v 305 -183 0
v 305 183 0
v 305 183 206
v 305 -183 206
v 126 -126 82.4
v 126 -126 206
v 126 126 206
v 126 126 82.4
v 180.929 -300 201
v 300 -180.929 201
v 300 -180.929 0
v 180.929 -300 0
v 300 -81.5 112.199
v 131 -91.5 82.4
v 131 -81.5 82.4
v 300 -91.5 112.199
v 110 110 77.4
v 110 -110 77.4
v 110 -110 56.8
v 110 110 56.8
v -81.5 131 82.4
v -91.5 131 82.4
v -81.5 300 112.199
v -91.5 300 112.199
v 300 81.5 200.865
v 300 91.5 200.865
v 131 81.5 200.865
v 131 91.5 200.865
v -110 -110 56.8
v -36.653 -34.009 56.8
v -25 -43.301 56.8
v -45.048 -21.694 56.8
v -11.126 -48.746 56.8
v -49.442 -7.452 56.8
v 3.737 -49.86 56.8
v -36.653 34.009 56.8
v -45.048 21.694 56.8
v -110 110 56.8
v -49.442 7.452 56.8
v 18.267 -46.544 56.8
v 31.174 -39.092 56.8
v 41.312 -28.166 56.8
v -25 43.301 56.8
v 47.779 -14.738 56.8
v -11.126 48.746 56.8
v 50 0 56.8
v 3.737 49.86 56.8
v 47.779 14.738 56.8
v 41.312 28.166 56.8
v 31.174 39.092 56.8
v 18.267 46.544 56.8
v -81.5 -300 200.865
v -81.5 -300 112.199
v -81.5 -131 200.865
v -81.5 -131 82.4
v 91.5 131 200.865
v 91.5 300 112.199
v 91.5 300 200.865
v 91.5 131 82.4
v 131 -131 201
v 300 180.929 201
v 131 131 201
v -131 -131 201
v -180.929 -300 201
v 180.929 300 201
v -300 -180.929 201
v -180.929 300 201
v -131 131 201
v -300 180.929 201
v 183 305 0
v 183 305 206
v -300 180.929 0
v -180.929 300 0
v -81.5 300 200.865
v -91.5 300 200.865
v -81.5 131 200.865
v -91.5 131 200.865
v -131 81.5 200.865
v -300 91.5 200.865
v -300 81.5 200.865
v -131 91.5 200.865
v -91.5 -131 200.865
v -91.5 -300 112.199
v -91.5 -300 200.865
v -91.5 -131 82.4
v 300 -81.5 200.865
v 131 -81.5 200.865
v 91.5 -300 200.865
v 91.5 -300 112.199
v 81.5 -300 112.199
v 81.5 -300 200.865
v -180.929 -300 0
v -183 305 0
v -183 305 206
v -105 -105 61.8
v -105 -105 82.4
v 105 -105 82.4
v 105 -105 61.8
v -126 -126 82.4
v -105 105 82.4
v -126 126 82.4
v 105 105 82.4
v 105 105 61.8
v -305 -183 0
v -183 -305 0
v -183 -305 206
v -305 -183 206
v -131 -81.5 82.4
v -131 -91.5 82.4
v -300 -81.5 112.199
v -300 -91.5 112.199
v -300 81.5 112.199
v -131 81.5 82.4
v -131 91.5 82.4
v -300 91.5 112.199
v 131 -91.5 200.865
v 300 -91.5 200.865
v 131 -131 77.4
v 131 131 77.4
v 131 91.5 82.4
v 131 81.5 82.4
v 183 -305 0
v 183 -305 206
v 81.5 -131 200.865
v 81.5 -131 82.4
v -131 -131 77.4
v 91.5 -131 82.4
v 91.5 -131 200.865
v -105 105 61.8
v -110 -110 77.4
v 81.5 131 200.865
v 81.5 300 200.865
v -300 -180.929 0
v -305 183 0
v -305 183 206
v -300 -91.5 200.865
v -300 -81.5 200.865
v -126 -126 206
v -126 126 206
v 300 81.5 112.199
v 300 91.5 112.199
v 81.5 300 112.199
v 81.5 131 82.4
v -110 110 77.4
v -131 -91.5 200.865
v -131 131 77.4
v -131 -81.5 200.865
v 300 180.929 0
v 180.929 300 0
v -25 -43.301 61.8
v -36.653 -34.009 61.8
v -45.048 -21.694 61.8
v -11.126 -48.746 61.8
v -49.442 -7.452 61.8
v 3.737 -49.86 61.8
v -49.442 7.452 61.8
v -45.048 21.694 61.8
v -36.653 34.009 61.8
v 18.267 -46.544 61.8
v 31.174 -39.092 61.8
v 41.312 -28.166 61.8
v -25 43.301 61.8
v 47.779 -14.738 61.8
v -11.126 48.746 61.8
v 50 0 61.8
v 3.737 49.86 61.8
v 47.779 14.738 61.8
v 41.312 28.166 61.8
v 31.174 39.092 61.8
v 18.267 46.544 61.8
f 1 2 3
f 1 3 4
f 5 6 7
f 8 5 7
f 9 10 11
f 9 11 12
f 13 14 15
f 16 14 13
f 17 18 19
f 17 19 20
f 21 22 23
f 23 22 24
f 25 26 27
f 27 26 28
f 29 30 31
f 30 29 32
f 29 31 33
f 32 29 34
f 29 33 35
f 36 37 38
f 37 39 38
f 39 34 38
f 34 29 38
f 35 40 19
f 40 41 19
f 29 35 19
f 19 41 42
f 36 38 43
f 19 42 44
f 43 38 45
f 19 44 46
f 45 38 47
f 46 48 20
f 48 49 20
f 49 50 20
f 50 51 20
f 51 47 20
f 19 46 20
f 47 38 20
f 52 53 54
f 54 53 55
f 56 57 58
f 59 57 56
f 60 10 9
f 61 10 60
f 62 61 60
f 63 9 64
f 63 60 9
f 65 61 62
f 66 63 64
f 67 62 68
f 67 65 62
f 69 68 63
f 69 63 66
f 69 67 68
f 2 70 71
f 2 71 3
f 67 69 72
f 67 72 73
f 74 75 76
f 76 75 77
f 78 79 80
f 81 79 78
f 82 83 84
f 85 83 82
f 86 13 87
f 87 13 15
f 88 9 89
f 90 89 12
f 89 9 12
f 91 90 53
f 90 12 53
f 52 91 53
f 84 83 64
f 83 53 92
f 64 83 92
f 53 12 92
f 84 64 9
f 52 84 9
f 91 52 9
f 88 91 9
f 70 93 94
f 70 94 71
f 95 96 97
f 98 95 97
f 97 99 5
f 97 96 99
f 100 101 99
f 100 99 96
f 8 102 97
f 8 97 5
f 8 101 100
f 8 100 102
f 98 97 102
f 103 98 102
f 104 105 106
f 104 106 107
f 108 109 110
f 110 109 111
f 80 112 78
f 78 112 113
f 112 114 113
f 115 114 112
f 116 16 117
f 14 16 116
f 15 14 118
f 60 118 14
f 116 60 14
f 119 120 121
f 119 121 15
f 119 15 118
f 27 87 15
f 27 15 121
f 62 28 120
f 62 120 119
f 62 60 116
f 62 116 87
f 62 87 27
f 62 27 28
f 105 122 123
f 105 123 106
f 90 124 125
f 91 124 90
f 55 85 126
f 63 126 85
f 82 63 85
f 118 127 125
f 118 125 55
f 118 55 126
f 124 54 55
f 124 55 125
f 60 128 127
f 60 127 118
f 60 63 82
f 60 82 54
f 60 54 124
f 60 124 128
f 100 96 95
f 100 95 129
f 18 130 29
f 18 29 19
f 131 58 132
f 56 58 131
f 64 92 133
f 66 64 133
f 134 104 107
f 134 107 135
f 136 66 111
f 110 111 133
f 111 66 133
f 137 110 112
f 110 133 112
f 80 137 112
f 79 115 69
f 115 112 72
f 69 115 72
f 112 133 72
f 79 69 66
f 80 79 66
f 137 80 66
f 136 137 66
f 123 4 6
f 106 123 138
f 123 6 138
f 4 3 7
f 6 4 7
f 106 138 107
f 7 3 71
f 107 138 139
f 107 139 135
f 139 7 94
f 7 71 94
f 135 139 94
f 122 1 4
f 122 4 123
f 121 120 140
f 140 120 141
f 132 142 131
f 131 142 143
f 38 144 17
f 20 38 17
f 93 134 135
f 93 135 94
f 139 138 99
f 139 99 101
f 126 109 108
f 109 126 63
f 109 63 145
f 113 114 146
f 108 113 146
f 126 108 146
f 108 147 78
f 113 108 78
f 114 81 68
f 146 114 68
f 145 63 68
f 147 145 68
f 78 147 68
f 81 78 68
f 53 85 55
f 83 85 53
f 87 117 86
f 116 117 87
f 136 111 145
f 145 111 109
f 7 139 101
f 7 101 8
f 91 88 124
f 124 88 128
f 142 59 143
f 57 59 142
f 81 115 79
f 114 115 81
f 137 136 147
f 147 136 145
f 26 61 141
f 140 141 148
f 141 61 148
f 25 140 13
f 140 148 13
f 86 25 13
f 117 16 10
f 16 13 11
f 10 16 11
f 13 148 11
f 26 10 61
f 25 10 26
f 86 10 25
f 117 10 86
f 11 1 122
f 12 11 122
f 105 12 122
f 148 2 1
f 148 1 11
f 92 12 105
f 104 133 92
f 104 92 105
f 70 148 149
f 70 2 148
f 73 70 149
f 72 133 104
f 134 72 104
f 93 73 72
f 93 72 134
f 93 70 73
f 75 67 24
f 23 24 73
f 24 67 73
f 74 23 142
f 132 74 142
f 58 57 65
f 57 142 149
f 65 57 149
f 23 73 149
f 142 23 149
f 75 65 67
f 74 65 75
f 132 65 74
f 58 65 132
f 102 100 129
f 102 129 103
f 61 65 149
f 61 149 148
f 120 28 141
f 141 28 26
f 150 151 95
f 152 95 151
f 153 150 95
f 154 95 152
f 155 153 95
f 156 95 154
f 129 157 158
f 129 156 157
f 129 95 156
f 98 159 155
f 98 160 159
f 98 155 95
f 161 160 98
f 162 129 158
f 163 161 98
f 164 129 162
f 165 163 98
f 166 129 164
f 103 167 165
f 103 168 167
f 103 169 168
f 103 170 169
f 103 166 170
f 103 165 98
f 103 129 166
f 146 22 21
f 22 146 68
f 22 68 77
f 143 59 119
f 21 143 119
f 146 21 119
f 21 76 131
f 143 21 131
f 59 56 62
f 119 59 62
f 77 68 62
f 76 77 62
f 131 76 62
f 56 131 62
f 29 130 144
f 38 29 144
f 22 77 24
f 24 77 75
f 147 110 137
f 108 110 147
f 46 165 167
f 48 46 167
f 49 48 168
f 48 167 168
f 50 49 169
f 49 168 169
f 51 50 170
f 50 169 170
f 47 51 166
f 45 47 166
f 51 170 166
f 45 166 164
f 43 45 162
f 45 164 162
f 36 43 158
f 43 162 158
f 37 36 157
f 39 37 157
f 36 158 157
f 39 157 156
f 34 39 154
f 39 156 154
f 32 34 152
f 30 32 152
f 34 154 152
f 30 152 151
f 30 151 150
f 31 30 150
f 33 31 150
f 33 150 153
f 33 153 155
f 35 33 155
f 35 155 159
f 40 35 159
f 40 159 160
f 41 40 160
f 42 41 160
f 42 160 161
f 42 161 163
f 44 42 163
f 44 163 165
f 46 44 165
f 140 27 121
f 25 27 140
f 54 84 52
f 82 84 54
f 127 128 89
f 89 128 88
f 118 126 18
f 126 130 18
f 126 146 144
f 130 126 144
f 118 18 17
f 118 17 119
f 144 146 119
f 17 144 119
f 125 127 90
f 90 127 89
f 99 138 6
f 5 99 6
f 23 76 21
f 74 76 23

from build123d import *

# Parameters (mm, degrees)
EXTRUDE_1_DEPTH                 = 206
SKETCH_2_W                      = 252
SKETCH_2_H                      = 252
CUT_EXTRUDE_1_DEPTH             = 123.6
SKETCH_3_W                      = 210
SKETCH_3_H                      = 210
CUT_EXTRUDE_2_DEPTH             = 144.2
SHELL_1_T                       = -5
SKETCH_4_R                      = 50
CUT_EXTRUDE_3_DEPTH             = 455.80065963
EXTRUDE_2_DEPTH                 = 10
PATTERN_CIRCULAR_1_COUNT        = 4
PATTERN_CIRCULAR_1_COPY_1_DEPTH = 10
PATTERN_CIRCULAR_1_COPY_2_DEPTH = 10
PATTERN_CIRCULAR_1_COPY_3_DEPTH = 10


with BuildPart() as part:
    # 草图1 → 凸台-拉伸1 (new body)
    with BuildSketch(Plane.XY):
        Polygon((-305, 183), (-183, 305), (183, 305), (305, 183), (305, -183), (183, -305), (-183, -305), (-305, -183), align=None)
    extrude(amount=EXTRUDE_1_DEPTH)

    # 草图2 → 切除-拉伸1 (cut)
    with BuildSketch(Plane.XY.offset(206)):
        Rectangle(SKETCH_2_W, SKETCH_2_H)
    extrude(amount=-CUT_EXTRUDE_1_DEPTH, mode=Mode.SUBTRACT)

    # 草图3 → 切除-拉伸2 (cut)
    with BuildSketch(Plane.XY.offset(206)):
        Rectangle(SKETCH_3_W, SKETCH_3_H)
    extrude(amount=-CUT_EXTRUDE_2_DEPTH, mode=Mode.SUBTRACT)

    # 抽壳1
    shell_1_openings = [part.faces().sort_by_distance(p)[0] for p in [
        (0, 0, 0),
    ]]
    offset(amount=SHELL_1_T, openings=shell_1_openings, kind=Kind.INTERSECTION)

    # 草图4 → 切除-拉伸3 (cut, through all)
    with BuildSketch(Plane.XY.offset(61.8)):
        Circle(SKETCH_4_R)
    extrude(amount=-CUT_EXTRUDE_3_DEPTH, mode=Mode.SUBTRACT)

    # 草图5 → 凸台-拉伸2 (add)
    with BuildSketch(Plane(origin=(0, 91.5, 0), x_dir=(1, 0, 0), z_dir=(0, 1, 0))):
        Polygon((-131, -82.4), (-300, -112.19925974), (-300, -200.864779471), (-131, -200.864779471), align=None)
    extrude_2 = extrude(amount=-EXTRUDE_2_DEPTH)

    # 镜向1: 凸台-拉伸2 across plane
    add(extrude_2.mirror(Plane.ZX))

    # 阵列(圆周)1: 凸台-拉伸2 ×4 about axis
    pattern_circular_1_axis = Axis((0, 0, 0), (0, 0, 1))
    for i in range(1, PATTERN_CIRCULAR_1_COUNT):
        add(extrude_2.rotate(pattern_circular_1_axis, i * 360 / PATTERN_CIRCULAR_1_COUNT))

    # 阵列(圆周)1 copy 1 sketch → 阵列(圆周)1 copy 1 (add)
    with BuildSketch(Plane.YZ.offset(91.5)):
        Polygon((-131, 82.4), (-300, 112.19925974), (-300, 200.864779471), (-131, 200.864779471), align=None)
    extrude(amount=-PATTERN_CIRCULAR_1_COPY_1_DEPTH)

    # 阵列(圆周)1 copy 2 sketch → 阵列(圆周)1 copy 2 (add)
    with BuildSketch(Plane(origin=(0, 91.5, 0), x_dir=(-1, 0, 0), z_dir=(0, 1, 0))):
        Polygon((-131, 82.4), (-300, 112.19925974), (-300, 200.864779471), (-131, 200.864779471), align=None)
    extrude(amount=-PATTERN_CIRCULAR_1_COPY_2_DEPTH)

    # 阵列(圆周)1 copy 3 sketch → 阵列(圆周)1 copy 3 (add)
    with BuildSketch(Plane(origin=(-91.5, 0, 0), x_dir=(0, -1, 0), z_dir=(-1, 0, 0))):
        Polygon((-131, 82.4), (-300, 112.19925974), (-300, 200.864779471), (-131, 200.864779471), align=None)
    extrude(amount=-PATTERN_CIRCULAR_1_COPY_3_DEPTH)


solid = part.part
